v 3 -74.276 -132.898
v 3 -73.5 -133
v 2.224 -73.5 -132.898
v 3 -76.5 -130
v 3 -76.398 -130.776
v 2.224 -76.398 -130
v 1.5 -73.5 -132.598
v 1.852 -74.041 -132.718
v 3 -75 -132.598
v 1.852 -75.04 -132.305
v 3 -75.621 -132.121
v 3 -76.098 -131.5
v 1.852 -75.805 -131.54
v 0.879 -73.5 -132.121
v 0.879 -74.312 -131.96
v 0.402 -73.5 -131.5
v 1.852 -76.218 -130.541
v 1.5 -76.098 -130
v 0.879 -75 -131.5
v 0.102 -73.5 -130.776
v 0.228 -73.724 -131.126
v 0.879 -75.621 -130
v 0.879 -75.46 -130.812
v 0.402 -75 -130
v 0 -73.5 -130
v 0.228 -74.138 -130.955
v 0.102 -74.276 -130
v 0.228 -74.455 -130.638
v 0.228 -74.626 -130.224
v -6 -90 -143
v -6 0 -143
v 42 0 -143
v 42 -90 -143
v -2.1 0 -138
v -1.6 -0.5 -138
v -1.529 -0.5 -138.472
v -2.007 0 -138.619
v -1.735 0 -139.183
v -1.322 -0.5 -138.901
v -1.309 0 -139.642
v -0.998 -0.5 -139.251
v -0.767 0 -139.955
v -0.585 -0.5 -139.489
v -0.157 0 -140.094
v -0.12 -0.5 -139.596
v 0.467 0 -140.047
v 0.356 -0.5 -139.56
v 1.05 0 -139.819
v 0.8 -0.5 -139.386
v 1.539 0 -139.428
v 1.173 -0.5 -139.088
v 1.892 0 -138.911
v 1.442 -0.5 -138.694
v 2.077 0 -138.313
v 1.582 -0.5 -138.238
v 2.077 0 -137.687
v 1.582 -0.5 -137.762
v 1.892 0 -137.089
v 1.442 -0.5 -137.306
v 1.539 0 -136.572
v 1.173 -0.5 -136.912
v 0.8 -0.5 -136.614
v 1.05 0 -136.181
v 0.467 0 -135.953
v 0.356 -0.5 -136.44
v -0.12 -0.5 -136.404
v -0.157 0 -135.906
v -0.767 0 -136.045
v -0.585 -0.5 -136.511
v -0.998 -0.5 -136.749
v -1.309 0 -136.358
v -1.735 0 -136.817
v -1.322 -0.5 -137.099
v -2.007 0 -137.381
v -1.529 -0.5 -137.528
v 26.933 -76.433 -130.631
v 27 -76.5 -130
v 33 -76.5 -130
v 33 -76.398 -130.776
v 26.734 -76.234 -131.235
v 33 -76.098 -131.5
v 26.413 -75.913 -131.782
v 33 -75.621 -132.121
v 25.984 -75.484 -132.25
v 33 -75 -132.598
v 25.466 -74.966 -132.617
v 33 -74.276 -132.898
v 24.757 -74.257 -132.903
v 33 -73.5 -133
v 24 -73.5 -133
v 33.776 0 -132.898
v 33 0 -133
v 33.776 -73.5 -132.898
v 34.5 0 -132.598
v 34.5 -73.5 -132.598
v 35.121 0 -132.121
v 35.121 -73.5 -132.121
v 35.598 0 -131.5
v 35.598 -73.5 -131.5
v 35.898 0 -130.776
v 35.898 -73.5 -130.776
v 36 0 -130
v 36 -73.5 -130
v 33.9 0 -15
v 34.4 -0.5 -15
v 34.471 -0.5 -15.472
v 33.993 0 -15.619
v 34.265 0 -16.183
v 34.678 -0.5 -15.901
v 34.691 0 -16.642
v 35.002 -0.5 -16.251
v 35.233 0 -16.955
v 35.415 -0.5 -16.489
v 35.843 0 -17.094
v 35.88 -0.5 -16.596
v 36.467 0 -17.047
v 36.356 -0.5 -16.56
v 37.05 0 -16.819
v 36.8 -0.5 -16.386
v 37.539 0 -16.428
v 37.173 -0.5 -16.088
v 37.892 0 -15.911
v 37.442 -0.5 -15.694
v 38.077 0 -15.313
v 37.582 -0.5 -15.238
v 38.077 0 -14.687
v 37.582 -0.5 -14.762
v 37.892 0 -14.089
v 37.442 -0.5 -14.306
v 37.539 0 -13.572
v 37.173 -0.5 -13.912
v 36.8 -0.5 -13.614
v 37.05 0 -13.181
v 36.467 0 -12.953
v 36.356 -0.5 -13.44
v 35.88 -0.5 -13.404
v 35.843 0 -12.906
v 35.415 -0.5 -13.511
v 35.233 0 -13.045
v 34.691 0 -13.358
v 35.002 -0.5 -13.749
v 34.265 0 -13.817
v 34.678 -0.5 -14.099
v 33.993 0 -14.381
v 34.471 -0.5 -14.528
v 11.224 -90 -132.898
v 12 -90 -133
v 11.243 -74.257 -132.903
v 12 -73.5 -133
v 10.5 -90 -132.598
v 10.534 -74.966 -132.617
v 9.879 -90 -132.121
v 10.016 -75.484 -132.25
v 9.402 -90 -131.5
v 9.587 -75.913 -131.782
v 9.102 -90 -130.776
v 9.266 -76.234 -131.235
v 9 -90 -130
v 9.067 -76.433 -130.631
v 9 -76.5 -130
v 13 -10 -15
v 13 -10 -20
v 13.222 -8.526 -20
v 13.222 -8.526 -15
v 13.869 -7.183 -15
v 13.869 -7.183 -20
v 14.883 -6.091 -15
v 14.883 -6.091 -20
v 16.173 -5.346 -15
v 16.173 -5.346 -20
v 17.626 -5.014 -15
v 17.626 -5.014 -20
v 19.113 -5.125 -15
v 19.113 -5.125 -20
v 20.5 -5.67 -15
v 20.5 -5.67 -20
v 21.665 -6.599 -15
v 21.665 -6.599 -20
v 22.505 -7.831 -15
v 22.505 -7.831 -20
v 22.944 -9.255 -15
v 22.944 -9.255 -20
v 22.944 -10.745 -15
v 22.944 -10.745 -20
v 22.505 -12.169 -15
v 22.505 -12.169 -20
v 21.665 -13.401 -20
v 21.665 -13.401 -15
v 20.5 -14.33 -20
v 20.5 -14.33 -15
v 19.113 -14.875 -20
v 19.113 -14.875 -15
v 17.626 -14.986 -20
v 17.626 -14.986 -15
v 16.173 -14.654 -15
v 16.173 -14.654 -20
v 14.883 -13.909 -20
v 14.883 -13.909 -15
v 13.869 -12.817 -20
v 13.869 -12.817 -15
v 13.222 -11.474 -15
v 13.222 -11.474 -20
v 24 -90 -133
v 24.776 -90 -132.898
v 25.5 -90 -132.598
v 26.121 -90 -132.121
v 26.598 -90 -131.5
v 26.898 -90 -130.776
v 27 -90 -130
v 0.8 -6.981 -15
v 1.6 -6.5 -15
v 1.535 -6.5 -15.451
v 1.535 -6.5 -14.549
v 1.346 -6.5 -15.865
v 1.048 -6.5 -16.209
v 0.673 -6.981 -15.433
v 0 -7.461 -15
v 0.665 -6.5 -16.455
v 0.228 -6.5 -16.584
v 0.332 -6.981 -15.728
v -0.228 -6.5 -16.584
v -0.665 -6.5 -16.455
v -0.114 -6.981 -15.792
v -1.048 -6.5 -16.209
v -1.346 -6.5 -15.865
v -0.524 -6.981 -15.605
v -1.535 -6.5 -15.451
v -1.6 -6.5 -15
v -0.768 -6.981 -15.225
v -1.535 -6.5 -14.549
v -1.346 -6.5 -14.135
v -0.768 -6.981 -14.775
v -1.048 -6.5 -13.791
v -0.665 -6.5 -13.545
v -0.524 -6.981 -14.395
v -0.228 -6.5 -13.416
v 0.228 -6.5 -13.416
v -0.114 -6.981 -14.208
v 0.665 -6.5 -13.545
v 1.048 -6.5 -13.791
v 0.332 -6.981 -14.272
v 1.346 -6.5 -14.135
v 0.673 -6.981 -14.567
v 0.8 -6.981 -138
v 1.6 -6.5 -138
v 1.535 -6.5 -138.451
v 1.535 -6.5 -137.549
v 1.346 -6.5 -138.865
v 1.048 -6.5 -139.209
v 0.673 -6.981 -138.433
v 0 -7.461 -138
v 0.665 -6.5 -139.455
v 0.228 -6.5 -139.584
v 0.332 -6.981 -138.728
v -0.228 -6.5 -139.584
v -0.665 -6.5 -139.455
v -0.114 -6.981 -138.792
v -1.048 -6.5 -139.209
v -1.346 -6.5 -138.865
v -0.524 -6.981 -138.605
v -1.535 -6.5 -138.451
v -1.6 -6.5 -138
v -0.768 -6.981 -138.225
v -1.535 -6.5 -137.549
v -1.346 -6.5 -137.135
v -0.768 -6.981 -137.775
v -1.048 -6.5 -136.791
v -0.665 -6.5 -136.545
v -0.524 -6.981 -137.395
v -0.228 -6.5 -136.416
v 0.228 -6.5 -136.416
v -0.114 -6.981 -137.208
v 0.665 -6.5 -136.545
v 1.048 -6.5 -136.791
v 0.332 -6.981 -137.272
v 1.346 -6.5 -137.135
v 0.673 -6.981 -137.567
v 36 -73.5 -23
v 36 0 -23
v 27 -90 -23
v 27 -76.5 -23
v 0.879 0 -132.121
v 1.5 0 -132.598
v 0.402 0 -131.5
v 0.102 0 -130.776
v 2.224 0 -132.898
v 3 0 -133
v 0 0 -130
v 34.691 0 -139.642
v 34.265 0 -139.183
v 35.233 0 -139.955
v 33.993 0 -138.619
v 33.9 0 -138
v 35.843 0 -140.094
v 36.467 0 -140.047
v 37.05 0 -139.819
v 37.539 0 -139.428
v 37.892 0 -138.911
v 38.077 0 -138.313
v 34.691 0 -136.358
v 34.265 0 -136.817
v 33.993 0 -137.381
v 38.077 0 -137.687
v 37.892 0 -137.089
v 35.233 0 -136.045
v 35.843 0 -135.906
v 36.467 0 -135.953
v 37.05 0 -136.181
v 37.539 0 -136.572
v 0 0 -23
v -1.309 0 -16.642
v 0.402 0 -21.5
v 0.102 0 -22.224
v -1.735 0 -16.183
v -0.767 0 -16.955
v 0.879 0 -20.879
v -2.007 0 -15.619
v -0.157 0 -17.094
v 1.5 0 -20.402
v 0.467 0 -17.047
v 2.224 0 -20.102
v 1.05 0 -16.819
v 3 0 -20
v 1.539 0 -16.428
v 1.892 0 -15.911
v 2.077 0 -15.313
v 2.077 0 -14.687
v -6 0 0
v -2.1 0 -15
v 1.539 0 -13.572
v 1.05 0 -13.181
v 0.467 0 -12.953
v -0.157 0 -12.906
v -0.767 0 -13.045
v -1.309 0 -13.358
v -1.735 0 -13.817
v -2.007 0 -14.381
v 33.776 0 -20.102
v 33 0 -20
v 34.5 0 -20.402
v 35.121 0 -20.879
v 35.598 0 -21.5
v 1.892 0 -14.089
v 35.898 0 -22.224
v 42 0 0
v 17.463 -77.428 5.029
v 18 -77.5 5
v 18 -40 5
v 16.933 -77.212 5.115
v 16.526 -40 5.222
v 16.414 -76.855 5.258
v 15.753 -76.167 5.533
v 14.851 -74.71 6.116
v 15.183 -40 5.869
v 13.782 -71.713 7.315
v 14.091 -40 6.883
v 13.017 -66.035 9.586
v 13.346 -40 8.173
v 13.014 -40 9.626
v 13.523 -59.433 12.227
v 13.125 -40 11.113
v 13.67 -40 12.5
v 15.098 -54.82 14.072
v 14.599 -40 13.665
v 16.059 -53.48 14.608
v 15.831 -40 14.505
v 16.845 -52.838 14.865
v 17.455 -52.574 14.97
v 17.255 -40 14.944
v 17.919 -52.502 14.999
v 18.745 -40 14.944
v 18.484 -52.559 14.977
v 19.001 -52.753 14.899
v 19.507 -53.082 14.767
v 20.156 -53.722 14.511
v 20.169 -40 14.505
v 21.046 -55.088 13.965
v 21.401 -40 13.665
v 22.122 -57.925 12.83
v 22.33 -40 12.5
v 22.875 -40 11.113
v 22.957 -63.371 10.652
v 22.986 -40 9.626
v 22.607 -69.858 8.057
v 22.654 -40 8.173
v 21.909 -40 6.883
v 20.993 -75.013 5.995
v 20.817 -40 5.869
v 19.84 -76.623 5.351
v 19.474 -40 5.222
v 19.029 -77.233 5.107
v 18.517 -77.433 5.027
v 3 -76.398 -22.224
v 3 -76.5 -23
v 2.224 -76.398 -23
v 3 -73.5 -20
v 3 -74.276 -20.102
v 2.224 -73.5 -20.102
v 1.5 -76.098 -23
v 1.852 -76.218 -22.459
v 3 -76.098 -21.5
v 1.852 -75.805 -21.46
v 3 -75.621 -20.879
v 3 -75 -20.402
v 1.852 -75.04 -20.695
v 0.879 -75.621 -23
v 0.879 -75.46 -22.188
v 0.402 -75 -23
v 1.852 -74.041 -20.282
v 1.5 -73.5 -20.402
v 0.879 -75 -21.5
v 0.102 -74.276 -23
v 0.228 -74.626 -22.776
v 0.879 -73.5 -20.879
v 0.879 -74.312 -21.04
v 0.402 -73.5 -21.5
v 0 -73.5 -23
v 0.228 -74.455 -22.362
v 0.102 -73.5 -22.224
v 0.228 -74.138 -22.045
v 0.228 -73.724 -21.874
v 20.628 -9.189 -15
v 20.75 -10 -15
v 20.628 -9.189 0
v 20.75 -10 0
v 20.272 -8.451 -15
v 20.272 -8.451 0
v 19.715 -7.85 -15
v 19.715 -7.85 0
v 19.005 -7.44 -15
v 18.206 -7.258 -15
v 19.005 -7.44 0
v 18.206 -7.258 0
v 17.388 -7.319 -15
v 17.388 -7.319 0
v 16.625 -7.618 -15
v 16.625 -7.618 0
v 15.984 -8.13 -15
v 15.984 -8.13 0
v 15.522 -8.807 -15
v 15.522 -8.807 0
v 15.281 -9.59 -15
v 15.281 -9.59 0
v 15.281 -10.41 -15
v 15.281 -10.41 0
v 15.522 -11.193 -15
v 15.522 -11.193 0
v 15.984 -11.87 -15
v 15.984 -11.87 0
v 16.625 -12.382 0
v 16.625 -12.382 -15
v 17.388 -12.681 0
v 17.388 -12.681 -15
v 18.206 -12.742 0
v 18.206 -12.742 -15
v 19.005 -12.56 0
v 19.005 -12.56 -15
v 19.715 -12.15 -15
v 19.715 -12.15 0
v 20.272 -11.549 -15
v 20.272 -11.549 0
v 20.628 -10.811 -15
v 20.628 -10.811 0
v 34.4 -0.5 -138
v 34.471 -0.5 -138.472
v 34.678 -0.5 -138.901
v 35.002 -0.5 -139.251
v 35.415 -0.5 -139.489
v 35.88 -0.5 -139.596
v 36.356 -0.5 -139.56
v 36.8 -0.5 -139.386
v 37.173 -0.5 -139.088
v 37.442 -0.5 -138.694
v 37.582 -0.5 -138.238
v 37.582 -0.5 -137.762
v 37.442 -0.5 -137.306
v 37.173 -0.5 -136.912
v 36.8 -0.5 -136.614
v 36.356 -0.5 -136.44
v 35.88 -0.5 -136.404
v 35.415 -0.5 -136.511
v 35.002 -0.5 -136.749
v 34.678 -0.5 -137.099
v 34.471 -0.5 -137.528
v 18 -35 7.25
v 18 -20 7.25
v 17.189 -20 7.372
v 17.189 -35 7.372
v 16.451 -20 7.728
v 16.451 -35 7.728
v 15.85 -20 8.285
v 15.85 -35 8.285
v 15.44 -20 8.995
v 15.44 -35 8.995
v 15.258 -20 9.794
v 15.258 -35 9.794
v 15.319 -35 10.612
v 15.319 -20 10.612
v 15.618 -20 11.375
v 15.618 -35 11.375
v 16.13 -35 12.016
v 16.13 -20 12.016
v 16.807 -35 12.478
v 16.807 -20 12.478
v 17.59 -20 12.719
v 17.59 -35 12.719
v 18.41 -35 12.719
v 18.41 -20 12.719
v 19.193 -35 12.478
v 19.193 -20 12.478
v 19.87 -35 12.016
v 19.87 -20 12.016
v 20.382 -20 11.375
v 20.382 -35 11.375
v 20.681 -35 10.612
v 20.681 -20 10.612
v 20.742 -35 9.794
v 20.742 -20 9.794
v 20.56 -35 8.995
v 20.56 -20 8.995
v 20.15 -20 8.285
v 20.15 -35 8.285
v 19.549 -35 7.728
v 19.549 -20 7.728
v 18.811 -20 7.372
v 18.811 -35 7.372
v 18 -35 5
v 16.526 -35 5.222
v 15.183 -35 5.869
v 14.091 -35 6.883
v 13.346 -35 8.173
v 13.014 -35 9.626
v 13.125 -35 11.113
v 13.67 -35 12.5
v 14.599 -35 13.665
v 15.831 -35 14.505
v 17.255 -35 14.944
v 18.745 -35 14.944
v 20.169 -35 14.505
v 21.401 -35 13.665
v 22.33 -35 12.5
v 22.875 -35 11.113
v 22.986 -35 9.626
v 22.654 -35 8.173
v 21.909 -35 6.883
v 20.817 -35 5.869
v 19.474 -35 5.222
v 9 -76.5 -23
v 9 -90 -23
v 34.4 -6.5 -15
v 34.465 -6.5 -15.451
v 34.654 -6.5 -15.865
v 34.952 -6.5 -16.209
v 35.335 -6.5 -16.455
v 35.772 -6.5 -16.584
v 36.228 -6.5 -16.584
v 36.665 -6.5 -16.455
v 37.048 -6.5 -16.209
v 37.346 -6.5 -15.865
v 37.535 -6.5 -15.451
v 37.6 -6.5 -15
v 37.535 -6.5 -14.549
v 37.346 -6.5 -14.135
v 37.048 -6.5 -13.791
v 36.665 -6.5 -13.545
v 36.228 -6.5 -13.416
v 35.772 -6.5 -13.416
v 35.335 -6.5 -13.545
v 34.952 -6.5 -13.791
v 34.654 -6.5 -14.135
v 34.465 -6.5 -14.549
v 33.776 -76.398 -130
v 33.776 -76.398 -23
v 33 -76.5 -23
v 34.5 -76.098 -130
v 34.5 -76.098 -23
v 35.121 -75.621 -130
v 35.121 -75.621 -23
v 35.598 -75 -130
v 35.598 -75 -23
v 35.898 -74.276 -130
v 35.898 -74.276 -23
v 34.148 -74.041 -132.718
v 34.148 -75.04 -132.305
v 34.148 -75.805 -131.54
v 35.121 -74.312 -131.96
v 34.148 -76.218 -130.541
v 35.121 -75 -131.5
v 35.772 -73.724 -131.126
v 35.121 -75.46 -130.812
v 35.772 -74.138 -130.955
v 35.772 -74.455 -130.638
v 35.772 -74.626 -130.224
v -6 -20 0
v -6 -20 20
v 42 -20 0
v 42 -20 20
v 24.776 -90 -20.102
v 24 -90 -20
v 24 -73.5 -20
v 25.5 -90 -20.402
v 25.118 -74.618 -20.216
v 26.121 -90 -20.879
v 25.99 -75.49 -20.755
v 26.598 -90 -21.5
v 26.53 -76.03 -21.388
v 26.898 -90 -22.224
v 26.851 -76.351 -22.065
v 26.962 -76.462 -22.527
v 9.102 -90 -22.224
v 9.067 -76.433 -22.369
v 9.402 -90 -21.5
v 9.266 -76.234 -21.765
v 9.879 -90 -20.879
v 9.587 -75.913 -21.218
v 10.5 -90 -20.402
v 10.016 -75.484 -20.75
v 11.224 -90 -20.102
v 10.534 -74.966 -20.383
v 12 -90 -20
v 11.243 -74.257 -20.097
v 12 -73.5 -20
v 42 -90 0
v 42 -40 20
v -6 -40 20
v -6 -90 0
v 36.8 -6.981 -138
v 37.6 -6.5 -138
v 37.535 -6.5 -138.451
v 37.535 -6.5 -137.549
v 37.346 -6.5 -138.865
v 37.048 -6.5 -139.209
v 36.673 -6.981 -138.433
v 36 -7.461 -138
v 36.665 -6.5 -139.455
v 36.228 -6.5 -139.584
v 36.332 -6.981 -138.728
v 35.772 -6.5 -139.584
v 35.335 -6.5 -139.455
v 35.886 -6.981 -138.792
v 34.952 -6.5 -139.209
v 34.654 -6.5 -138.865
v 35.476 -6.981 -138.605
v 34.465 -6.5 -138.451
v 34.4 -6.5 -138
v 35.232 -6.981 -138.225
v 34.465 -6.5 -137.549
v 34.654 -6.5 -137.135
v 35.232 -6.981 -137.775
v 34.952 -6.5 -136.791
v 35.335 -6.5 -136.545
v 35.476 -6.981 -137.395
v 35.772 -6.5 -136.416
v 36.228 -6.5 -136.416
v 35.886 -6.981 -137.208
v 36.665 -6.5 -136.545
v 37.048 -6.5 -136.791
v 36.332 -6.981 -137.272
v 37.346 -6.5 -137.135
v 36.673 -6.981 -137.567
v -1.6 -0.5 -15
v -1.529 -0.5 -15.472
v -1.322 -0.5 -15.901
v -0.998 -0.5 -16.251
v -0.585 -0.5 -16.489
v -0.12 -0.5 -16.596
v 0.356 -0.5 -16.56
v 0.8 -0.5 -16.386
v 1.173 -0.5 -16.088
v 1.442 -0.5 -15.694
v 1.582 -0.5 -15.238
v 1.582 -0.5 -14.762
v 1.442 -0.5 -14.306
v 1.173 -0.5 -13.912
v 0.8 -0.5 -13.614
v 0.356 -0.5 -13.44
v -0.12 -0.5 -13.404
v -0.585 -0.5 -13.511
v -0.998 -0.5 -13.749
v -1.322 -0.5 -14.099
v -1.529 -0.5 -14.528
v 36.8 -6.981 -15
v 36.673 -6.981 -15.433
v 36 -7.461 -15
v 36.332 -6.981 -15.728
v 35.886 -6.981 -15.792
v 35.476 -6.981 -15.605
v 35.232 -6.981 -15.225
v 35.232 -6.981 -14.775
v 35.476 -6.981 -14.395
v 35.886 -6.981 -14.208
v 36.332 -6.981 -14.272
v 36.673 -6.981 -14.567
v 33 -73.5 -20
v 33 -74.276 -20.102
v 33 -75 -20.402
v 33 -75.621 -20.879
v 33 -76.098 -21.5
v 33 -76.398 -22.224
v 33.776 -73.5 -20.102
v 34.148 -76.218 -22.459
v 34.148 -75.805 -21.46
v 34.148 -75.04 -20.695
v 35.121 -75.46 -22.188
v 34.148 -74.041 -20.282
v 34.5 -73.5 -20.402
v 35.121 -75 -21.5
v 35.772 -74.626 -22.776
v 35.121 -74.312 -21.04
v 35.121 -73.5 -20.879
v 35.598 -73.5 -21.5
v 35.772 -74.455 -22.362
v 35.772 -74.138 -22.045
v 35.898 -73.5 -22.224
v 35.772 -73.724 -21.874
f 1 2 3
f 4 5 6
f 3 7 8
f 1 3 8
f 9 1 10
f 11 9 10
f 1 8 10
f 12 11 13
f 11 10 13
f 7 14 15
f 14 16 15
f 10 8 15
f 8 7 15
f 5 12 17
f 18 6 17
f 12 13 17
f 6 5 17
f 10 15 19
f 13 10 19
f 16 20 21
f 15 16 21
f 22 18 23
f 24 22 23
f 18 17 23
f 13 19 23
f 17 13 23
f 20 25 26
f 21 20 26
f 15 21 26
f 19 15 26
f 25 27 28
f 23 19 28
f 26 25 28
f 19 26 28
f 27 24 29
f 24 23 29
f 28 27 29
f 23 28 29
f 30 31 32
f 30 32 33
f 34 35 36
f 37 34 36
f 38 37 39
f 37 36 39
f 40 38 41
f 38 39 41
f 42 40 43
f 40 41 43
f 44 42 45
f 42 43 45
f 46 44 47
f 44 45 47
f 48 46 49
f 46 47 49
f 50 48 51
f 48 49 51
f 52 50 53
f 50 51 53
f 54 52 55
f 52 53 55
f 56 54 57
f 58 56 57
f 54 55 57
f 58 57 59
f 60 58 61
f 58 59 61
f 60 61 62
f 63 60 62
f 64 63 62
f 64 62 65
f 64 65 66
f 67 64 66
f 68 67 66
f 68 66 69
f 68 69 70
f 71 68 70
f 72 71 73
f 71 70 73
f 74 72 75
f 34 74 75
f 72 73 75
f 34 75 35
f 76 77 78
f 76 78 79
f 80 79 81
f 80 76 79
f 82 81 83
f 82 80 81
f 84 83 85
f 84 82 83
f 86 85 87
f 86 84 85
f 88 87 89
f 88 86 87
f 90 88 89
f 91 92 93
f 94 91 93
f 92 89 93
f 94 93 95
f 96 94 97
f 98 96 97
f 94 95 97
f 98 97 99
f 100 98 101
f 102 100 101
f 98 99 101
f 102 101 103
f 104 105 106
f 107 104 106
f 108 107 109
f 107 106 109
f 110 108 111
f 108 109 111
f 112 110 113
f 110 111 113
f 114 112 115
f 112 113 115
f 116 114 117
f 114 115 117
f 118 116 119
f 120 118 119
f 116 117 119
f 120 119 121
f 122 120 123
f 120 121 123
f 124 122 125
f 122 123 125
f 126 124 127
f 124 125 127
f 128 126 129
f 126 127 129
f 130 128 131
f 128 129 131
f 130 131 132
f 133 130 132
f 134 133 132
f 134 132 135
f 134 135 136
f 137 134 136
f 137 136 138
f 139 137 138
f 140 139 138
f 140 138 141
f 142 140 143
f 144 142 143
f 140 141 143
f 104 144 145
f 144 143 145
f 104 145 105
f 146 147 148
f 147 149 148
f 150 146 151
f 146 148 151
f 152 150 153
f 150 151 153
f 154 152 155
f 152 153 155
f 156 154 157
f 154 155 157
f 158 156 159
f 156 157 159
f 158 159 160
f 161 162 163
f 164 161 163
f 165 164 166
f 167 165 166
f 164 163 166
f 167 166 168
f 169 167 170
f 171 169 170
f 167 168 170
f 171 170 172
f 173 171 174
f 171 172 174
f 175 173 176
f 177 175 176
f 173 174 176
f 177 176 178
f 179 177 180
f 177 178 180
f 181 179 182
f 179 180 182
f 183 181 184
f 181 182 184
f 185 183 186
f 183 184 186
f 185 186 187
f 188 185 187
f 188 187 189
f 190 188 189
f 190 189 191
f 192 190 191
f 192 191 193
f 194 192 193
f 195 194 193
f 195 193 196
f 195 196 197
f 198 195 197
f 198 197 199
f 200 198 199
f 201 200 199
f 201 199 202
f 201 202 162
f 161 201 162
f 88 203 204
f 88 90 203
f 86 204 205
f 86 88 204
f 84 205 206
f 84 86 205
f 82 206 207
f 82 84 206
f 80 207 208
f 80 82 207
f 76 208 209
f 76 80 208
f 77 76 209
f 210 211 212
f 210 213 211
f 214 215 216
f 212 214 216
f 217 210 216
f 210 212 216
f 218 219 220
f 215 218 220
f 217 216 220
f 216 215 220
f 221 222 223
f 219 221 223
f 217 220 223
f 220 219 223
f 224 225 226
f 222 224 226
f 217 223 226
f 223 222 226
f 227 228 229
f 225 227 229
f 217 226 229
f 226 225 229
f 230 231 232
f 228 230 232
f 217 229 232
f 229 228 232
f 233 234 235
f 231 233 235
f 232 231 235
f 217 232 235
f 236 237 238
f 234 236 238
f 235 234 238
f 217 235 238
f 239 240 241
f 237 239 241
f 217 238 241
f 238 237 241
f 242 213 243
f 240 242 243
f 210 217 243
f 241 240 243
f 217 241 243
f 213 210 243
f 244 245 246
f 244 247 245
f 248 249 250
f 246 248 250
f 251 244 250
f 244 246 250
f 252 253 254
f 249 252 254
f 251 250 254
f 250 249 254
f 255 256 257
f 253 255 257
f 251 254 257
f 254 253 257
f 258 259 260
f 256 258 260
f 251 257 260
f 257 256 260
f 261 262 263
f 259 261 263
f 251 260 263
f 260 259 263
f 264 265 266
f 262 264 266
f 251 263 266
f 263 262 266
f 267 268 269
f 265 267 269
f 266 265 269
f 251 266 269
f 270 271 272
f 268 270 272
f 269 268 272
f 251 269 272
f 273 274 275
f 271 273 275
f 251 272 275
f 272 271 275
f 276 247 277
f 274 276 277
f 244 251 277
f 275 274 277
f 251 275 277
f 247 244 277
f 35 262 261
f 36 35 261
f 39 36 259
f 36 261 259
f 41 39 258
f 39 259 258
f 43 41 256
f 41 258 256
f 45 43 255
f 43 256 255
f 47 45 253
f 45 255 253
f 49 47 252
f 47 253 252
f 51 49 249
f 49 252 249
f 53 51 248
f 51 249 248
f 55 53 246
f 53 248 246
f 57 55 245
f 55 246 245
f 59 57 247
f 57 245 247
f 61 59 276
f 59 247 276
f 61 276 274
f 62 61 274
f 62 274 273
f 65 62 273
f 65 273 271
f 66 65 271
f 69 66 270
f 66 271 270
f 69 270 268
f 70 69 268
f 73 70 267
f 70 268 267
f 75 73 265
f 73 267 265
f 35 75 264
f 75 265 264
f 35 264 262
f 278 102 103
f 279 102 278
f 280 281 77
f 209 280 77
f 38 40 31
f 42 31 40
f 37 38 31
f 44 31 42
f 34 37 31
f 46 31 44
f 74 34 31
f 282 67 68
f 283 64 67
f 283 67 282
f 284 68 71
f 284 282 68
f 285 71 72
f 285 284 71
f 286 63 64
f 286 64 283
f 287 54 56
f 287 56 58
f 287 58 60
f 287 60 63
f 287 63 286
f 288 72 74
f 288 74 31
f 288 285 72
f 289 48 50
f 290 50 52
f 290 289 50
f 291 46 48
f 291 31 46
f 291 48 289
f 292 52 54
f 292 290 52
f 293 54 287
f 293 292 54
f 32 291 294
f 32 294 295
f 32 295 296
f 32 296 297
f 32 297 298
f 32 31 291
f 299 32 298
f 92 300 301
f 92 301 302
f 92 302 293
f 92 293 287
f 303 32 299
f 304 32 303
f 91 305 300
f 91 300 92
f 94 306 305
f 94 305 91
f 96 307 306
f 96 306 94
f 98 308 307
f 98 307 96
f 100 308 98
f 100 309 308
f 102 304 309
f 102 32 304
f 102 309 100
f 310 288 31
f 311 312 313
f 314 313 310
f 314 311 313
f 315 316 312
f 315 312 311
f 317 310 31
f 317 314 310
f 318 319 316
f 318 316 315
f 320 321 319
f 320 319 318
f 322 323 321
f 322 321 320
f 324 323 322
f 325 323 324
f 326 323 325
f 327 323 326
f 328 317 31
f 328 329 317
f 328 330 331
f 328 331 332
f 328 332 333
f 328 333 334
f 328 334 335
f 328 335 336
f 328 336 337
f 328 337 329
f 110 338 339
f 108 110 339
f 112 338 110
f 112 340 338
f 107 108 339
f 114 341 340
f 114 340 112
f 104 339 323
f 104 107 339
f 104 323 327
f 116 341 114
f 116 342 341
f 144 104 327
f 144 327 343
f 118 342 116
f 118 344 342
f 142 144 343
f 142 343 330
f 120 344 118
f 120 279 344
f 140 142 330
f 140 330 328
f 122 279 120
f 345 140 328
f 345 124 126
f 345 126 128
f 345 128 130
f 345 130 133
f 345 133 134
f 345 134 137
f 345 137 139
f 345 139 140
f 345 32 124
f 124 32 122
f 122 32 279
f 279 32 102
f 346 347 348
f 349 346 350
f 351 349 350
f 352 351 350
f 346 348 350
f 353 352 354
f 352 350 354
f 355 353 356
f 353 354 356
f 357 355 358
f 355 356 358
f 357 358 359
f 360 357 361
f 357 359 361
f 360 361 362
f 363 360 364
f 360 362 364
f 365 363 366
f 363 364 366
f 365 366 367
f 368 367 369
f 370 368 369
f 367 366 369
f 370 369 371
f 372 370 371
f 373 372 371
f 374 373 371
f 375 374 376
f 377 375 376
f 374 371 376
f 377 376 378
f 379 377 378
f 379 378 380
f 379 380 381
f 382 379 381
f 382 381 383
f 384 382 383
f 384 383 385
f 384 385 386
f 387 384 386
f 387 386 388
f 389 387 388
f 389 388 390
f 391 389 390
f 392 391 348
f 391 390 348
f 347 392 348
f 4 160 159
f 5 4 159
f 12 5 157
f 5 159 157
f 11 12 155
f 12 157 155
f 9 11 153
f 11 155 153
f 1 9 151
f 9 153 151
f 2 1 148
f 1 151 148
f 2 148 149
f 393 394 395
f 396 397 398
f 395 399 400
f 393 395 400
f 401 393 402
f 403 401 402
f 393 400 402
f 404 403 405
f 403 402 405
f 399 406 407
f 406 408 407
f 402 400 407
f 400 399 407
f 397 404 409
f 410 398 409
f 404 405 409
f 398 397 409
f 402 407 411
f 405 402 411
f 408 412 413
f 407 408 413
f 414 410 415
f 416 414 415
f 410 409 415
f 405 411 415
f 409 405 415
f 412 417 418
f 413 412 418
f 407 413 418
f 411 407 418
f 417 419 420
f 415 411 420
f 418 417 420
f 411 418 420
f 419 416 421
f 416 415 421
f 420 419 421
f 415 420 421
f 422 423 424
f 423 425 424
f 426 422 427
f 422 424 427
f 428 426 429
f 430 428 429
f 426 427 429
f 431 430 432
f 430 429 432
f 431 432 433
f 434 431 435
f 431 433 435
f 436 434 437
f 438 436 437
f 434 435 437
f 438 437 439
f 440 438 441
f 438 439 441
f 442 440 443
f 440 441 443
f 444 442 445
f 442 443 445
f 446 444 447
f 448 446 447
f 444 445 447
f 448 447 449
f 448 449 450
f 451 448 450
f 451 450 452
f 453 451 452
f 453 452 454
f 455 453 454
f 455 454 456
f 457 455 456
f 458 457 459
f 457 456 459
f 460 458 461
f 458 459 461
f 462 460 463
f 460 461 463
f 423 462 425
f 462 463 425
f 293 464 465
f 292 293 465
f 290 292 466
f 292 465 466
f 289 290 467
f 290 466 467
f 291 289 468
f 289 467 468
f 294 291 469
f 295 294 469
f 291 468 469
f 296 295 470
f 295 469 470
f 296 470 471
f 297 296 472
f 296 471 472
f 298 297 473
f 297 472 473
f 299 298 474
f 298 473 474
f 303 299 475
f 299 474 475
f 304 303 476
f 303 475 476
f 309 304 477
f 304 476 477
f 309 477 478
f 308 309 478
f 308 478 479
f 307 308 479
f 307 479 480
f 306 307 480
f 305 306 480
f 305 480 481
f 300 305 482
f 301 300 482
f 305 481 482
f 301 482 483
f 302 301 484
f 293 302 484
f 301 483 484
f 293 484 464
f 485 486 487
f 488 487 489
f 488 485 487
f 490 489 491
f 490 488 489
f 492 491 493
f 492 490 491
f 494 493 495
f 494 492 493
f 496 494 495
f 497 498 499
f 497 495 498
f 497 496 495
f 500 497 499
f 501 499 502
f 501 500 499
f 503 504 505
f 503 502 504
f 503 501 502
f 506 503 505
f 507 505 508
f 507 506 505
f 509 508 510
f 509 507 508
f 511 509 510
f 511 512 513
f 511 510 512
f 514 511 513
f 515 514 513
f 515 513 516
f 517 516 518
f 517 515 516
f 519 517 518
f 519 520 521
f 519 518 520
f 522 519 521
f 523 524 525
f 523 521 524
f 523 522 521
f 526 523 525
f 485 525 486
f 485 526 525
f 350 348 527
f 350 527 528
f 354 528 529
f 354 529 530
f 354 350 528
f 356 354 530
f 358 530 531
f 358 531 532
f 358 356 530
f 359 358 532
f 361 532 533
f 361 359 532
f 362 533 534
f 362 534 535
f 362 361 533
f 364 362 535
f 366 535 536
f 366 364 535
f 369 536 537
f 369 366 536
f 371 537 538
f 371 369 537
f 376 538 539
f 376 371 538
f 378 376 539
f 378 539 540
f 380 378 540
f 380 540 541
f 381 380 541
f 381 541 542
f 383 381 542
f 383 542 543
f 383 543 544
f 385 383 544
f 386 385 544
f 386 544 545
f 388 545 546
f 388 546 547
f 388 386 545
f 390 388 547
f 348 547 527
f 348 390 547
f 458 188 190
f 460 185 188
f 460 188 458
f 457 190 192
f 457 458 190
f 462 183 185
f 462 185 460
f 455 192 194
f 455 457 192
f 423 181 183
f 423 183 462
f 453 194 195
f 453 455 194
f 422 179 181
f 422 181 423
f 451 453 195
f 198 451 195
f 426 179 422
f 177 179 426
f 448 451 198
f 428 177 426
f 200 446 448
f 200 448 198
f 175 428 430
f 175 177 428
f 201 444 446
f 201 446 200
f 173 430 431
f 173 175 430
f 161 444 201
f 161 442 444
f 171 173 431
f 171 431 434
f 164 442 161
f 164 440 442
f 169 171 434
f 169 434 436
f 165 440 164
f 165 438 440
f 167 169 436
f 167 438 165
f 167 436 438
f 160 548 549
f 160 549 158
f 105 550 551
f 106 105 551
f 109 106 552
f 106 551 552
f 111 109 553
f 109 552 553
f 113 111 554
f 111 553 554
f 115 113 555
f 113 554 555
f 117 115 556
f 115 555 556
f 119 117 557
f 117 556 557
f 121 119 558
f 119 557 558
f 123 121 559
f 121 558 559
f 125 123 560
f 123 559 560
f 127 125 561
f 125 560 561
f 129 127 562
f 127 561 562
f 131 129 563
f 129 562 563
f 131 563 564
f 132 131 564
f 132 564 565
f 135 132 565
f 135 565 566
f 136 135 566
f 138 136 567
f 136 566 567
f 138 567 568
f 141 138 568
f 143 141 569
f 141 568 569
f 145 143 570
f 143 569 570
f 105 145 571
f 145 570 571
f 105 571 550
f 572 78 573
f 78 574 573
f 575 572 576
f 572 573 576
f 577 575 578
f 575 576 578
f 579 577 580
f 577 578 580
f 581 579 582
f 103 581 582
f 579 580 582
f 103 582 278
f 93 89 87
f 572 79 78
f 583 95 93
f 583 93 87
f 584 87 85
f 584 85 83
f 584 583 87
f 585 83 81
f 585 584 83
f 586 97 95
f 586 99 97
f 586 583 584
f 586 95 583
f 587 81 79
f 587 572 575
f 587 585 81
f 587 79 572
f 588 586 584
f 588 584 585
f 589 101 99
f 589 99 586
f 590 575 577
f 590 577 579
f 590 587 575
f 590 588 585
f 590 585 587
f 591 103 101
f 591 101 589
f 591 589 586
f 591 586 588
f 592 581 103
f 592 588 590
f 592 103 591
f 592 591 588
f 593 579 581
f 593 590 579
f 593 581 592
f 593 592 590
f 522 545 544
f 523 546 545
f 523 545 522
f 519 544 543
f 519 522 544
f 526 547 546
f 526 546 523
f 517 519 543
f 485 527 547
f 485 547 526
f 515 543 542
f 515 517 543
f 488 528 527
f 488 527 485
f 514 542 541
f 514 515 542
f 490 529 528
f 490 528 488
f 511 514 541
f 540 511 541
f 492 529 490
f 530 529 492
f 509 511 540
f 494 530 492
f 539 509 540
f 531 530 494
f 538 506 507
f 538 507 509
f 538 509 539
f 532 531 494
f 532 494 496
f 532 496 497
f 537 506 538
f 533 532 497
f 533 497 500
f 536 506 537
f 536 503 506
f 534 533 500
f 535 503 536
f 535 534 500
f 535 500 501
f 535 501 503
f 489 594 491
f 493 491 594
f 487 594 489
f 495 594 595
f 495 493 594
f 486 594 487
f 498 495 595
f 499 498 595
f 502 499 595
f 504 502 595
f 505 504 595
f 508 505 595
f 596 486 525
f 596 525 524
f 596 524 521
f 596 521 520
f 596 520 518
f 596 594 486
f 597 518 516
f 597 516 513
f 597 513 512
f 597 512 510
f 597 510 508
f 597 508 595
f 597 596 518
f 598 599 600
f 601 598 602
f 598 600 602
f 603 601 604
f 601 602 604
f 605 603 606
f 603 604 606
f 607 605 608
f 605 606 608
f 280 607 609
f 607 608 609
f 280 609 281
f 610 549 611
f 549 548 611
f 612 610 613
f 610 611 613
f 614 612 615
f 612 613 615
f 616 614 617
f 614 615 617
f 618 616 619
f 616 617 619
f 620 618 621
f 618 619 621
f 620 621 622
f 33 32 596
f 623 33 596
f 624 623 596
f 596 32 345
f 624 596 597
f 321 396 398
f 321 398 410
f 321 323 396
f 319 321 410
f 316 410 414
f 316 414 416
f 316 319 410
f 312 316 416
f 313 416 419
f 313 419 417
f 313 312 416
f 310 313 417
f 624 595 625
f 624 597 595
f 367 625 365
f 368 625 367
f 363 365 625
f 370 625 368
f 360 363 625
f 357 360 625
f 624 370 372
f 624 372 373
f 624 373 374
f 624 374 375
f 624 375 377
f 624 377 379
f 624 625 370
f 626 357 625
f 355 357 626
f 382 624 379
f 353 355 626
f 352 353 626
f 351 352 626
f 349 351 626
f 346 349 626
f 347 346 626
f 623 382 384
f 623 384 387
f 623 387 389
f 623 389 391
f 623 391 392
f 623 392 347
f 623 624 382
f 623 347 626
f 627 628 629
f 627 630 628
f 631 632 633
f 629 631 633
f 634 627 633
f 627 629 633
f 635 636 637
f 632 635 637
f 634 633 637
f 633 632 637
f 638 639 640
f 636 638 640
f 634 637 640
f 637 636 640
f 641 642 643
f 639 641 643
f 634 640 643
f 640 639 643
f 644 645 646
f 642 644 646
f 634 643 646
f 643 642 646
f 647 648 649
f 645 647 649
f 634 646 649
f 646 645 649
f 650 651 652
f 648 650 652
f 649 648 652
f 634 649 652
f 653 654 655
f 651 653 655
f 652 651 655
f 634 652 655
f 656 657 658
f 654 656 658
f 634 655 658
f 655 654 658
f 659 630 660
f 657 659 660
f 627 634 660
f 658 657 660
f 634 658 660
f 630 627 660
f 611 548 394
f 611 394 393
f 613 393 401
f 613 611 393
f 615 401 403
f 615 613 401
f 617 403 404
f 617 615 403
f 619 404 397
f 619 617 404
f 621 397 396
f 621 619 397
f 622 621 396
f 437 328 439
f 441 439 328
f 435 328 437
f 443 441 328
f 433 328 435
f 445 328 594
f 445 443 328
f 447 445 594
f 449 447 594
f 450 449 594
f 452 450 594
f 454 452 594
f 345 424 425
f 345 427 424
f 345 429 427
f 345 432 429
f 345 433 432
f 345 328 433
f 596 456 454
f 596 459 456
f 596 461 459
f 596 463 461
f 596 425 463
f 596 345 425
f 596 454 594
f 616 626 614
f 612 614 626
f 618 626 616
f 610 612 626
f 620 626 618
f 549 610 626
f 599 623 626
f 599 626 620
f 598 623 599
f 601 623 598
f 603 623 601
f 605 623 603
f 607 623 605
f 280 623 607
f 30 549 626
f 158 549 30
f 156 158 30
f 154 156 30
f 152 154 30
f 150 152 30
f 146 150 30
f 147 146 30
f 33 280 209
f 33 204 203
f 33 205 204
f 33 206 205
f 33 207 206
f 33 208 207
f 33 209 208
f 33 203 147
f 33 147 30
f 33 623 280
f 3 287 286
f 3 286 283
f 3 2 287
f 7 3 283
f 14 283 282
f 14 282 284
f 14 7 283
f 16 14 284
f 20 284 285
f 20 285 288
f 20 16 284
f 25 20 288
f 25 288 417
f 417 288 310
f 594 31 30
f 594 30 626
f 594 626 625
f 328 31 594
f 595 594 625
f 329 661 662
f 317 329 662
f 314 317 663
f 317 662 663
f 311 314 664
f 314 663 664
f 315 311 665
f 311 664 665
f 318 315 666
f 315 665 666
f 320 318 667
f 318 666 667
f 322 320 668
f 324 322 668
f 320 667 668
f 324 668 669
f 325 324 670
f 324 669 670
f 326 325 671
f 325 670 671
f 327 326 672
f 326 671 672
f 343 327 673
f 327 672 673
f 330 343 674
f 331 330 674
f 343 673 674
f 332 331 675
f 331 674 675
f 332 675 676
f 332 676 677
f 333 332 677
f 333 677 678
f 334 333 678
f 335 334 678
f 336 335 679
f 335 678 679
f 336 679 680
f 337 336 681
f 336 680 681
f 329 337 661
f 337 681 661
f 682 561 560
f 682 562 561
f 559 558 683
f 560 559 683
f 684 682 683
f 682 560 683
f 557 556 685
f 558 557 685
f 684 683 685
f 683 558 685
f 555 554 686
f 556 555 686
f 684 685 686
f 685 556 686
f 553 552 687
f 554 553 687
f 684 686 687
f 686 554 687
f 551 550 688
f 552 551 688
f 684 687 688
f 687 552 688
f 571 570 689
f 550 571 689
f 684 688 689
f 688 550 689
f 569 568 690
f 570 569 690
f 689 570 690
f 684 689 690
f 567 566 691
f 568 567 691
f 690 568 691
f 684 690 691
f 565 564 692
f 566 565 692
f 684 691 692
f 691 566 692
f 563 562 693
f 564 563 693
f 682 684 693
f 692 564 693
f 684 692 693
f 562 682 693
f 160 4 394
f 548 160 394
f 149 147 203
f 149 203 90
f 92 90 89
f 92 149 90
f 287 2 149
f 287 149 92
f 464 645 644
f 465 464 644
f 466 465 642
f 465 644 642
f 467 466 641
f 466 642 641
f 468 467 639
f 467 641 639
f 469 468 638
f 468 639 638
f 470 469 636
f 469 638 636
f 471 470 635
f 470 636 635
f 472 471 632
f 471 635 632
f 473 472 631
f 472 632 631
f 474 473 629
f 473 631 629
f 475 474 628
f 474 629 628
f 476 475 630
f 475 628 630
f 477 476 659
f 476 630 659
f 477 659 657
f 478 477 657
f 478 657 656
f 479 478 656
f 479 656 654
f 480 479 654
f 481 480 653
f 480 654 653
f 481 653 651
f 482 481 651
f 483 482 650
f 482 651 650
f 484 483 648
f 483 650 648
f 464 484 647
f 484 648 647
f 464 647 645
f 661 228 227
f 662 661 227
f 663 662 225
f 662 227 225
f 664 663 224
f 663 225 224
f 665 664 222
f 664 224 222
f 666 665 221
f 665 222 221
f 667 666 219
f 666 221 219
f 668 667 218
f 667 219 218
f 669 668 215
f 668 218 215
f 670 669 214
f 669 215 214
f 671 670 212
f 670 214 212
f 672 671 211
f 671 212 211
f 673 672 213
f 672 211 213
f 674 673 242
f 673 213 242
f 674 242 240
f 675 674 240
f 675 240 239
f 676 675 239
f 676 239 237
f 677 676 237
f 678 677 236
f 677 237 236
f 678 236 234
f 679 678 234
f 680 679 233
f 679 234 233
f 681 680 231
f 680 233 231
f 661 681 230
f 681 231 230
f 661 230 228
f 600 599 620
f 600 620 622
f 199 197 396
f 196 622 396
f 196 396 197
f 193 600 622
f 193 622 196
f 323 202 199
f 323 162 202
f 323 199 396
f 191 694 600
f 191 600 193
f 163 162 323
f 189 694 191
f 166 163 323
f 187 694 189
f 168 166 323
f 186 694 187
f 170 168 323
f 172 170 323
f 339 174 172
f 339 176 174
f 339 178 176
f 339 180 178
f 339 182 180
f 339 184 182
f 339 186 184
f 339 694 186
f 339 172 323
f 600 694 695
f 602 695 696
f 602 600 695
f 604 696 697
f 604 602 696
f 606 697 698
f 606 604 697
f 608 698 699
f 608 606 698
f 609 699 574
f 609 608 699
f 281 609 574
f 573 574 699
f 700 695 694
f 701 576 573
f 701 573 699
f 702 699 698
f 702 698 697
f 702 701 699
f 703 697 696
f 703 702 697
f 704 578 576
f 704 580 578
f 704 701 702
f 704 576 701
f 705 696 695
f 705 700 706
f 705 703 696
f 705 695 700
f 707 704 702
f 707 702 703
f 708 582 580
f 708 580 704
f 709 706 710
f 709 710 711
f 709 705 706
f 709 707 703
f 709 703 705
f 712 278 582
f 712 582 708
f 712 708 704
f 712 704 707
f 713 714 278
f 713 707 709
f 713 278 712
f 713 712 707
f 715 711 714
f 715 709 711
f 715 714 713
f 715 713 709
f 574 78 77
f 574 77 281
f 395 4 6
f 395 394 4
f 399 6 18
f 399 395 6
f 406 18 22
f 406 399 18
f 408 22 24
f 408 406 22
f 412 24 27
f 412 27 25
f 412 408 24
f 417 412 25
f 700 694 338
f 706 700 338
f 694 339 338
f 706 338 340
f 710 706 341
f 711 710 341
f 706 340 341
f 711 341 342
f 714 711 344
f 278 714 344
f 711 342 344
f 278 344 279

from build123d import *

# Parameters (mm, degrees)
BOSS_EXTRUDE1_DEPTH            = 9
BOSS_EXTRUDE2_DEPTH            = 6
SKETCH3_W                      = 10
SKETCH3_H                      = 90
BOSS_EXTRUDE3_DEPTH            = 9
FILLET1_R                      = 3
FILLET1_OF_MIRROR4_R           = 3
FILLET2_R                      = 3
F_2_5MM_DOWEL_HOLE1_D          = 3.2
F_2_5MM_DOWEL_HOLE1_DEPTH      = 6.5
F_2_5MM_DOWEL_HOLE1_TIP        = 0.96137699
CHAMFER1_SIZE                  = 0.5
SKETCH8_R                      = 5
CUT_EXTRUDE1_DEPTH             = 158.203689524
CBORE_FOR_M5_SHCS2_D           = 5.5
CBORE_FOR_M5_SHCS2_DEPTH       = 40
CBORE_FOR_M5_SHCS2_CBORE_D     = 10
CBORE_FOR_M5_SHCS2_CBORE_DEPTH = 5


with BuildPart() as part:
    # Sketch1 → Boss-Extrude1 (new body)
    with BuildSketch(Plane(origin=(0, 0, 0), x_dir=(0, 0, -1), z_dir=(1, 0, 0))):
        Polygon((0, 0), (0, -20), (-20, -20), (-20, -40), (0, -90), (143, -90), (143, 0), (133, 0), (133, -76.5), (20, -76.5), (20, 0), align=None)
    boss_extrude1 = extrude(amount=BOSS_EXTRUDE1_DEPTH)

    # Sketch2 → Boss-Extrude2 (add)
    with BuildSketch(Plane.ZY):
        Polygon((0, 0), (-143, 0), (-143, -90), (0, -90), (20, -40), (20, -20), (0, -20), align=None)
    boss_extrude2 = extrude(amount=BOSS_EXTRUDE2_DEPTH)

    # Sketch3 → Boss-Extrude3 (add)
    with BuildSketch(Plane(origin=(9, 0, 0), x_dir=(0, 0, -1), z_dir=(1, 0, 0))):
        Polygon((0, -90), (20, -90), (20, 0), (0, 0), (0, -20), (-20, -20), (-20, -40), align=None)
        with Locations((138, -45)):
            Rectangle(SKETCH3_W, SKETCH3_H)
    boss_extrude3 = extrude(amount=BOSS_EXTRUDE3_DEPTH)

    # Fillet1
    fillet1_edges = [part.edges().sort_by_distance(p)[0] for p in [
        (4.5, -76.5, -20),
        (4.5, -76.5, -133),
        (9, -83.25, -133),
        (9, -83.25, -20),
    ]]
    fillet(fillet1_edges, radius=FILLET1_R)

    # Mirror4: Boss-Extrude1, Boss-Extrude2, Boss-Extrude3 across plane
    add(boss_extrude1.mirror(Plane(origin=(18, 0, 0), x_dir=(0, 0, 1), z_dir=(1, 0, 0))))
    add(boss_extrude2.mirror(Plane(origin=(18, 0, 0), x_dir=(0, 0, 1), z_dir=(1, 0, 0))))
    add(boss_extrude3.mirror(Plane(origin=(18, 0, 0), x_dir=(0, 0, 1), z_dir=(1, 0, 0))))

    # Fillet1 of Mirror4
    fillet1_of_mirror4_edges = [part.edges().sort_by_distance(p)[0] for p in [
        (31.5, -76.5, -20),
        (31.5, -76.5, -133),
        (27, -83.25, -133),
        (27, -83.25, -20),
    ]]
    fillet(fillet1_of_mirror4_edges, radius=FILLET1_OF_MIRROR4_R)

    # Fillet2
    fillet2_edges = [part.edges().sort_by_distance(p)[0] for p in [
        (36, -76.5, -76.5),
        (36, -36.75, -20),
        (36, -36.75, -133),
        (36, -75.621320344, -20.878679656),
        (36, -75.621320344, -132.121320344),
        (0, -36.75, -133),
        (0, -36.75, -20),
        (0, -76.5, -76.5),
        (0, -75.621320344, -20.878679656),
        (0, -75.621320344, -132.121320344),
    ]]
    fillet(fillet2_edges, radius=FILLET2_R)

    # Ø2.5mm Dowel Hole1
    with Locations(Plane(origin=(0, 0, 0), x_dir=(1, 0, 0), z_dir=(0, 1, 0))):
        with Locations((36, 138), (0, 138), (0, 15), (36, 15)):
            Hole(F_2_5MM_DOWEL_HOLE1_D / 2, depth=F_2_5MM_DOWEL_HOLE1_DEPTH)
            with Locations((0, 0, -(F_2_5MM_DOWEL_HOLE1_DEPTH + F_2_5MM_DOWEL_HOLE1_TIP / 2))):  # 118° drill point
                Cone(0, F_2_5MM_DOWEL_HOLE1_D / 2, F_2_5MM_DOWEL_HOLE1_TIP, mode=Mode.SUBTRACT)

    # Chamfer1
    chamfer1_edges = [part.edges().sort_by_distance(p)[0] for p in [
        (37.6, 0, -138),
        (37.6, 0, -15),
        (1.6, 0, -15),
        (1.6, 0, -138),
    ]]
    chamfer(chamfer1_edges, length=CHAMFER1_SIZE)

    # Sketch7 → CBORE for M5 SHCS1 (revolve, cut)
    with BuildSketch(Plane(origin=(18, -40, 10), x_dir=(0, 0, -1), z_dir=(1, 0, 0))):
        Polygon((0, 0), (0, 40), (2.75, 40), (2.75, 5), (5, 5), (5, 0), align=None)
    revolve(axis=Axis((18, -46.35, 10), (0, 1, 0)), mode=Mode.SUBTRACT)

    # Sketch8 → Cut-Extrude1 (cut, through all)
    with BuildSketch(Plane(origin=(0, -40, 0), x_dir=(1, 0, 0), z_dir=(0, 1, 0))):
        with Locations(Location((18, -10, 0), (0, 0, 90))):
            Circle(SKETCH8_R)
    extrude(amount=-CUT_EXTRUDE1_DEPTH, mode=Mode.SUBTRACT)

    # CBORE for M5 SHCS2
    with Locations(Plane(origin=(0, 0, -20), x_dir=(-1, 0, 0), z_dir=(0, 0, -1))):
        with Locations((-18, -10)):
            CounterBoreHole(CBORE_FOR_M5_SHCS2_D / 2, CBORE_FOR_M5_SHCS2_CBORE_D / 2, CBORE_FOR_M5_SHCS2_CBORE_DEPTH, depth=CBORE_FOR_M5_SHCS2_DEPTH)


solid = part.part
